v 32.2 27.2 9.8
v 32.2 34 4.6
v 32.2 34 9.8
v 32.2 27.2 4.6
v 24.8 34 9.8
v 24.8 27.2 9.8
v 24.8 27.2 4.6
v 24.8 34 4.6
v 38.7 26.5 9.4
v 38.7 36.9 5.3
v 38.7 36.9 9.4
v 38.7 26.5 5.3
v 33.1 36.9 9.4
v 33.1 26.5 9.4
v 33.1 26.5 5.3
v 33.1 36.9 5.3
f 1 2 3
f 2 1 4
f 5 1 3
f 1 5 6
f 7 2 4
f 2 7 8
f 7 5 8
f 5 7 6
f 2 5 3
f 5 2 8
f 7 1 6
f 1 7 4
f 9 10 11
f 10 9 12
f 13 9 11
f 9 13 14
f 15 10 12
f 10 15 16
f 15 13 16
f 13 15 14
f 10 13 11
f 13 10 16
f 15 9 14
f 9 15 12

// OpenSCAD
union() {
  translate([24.8, 27.2, 4.6]) cube(size=[7.4,6.8,5.2], center=false);
  translate([33.1, 26.5, 5.3]) cube(size=[5.6,10.4,4.1], center=false);
}
